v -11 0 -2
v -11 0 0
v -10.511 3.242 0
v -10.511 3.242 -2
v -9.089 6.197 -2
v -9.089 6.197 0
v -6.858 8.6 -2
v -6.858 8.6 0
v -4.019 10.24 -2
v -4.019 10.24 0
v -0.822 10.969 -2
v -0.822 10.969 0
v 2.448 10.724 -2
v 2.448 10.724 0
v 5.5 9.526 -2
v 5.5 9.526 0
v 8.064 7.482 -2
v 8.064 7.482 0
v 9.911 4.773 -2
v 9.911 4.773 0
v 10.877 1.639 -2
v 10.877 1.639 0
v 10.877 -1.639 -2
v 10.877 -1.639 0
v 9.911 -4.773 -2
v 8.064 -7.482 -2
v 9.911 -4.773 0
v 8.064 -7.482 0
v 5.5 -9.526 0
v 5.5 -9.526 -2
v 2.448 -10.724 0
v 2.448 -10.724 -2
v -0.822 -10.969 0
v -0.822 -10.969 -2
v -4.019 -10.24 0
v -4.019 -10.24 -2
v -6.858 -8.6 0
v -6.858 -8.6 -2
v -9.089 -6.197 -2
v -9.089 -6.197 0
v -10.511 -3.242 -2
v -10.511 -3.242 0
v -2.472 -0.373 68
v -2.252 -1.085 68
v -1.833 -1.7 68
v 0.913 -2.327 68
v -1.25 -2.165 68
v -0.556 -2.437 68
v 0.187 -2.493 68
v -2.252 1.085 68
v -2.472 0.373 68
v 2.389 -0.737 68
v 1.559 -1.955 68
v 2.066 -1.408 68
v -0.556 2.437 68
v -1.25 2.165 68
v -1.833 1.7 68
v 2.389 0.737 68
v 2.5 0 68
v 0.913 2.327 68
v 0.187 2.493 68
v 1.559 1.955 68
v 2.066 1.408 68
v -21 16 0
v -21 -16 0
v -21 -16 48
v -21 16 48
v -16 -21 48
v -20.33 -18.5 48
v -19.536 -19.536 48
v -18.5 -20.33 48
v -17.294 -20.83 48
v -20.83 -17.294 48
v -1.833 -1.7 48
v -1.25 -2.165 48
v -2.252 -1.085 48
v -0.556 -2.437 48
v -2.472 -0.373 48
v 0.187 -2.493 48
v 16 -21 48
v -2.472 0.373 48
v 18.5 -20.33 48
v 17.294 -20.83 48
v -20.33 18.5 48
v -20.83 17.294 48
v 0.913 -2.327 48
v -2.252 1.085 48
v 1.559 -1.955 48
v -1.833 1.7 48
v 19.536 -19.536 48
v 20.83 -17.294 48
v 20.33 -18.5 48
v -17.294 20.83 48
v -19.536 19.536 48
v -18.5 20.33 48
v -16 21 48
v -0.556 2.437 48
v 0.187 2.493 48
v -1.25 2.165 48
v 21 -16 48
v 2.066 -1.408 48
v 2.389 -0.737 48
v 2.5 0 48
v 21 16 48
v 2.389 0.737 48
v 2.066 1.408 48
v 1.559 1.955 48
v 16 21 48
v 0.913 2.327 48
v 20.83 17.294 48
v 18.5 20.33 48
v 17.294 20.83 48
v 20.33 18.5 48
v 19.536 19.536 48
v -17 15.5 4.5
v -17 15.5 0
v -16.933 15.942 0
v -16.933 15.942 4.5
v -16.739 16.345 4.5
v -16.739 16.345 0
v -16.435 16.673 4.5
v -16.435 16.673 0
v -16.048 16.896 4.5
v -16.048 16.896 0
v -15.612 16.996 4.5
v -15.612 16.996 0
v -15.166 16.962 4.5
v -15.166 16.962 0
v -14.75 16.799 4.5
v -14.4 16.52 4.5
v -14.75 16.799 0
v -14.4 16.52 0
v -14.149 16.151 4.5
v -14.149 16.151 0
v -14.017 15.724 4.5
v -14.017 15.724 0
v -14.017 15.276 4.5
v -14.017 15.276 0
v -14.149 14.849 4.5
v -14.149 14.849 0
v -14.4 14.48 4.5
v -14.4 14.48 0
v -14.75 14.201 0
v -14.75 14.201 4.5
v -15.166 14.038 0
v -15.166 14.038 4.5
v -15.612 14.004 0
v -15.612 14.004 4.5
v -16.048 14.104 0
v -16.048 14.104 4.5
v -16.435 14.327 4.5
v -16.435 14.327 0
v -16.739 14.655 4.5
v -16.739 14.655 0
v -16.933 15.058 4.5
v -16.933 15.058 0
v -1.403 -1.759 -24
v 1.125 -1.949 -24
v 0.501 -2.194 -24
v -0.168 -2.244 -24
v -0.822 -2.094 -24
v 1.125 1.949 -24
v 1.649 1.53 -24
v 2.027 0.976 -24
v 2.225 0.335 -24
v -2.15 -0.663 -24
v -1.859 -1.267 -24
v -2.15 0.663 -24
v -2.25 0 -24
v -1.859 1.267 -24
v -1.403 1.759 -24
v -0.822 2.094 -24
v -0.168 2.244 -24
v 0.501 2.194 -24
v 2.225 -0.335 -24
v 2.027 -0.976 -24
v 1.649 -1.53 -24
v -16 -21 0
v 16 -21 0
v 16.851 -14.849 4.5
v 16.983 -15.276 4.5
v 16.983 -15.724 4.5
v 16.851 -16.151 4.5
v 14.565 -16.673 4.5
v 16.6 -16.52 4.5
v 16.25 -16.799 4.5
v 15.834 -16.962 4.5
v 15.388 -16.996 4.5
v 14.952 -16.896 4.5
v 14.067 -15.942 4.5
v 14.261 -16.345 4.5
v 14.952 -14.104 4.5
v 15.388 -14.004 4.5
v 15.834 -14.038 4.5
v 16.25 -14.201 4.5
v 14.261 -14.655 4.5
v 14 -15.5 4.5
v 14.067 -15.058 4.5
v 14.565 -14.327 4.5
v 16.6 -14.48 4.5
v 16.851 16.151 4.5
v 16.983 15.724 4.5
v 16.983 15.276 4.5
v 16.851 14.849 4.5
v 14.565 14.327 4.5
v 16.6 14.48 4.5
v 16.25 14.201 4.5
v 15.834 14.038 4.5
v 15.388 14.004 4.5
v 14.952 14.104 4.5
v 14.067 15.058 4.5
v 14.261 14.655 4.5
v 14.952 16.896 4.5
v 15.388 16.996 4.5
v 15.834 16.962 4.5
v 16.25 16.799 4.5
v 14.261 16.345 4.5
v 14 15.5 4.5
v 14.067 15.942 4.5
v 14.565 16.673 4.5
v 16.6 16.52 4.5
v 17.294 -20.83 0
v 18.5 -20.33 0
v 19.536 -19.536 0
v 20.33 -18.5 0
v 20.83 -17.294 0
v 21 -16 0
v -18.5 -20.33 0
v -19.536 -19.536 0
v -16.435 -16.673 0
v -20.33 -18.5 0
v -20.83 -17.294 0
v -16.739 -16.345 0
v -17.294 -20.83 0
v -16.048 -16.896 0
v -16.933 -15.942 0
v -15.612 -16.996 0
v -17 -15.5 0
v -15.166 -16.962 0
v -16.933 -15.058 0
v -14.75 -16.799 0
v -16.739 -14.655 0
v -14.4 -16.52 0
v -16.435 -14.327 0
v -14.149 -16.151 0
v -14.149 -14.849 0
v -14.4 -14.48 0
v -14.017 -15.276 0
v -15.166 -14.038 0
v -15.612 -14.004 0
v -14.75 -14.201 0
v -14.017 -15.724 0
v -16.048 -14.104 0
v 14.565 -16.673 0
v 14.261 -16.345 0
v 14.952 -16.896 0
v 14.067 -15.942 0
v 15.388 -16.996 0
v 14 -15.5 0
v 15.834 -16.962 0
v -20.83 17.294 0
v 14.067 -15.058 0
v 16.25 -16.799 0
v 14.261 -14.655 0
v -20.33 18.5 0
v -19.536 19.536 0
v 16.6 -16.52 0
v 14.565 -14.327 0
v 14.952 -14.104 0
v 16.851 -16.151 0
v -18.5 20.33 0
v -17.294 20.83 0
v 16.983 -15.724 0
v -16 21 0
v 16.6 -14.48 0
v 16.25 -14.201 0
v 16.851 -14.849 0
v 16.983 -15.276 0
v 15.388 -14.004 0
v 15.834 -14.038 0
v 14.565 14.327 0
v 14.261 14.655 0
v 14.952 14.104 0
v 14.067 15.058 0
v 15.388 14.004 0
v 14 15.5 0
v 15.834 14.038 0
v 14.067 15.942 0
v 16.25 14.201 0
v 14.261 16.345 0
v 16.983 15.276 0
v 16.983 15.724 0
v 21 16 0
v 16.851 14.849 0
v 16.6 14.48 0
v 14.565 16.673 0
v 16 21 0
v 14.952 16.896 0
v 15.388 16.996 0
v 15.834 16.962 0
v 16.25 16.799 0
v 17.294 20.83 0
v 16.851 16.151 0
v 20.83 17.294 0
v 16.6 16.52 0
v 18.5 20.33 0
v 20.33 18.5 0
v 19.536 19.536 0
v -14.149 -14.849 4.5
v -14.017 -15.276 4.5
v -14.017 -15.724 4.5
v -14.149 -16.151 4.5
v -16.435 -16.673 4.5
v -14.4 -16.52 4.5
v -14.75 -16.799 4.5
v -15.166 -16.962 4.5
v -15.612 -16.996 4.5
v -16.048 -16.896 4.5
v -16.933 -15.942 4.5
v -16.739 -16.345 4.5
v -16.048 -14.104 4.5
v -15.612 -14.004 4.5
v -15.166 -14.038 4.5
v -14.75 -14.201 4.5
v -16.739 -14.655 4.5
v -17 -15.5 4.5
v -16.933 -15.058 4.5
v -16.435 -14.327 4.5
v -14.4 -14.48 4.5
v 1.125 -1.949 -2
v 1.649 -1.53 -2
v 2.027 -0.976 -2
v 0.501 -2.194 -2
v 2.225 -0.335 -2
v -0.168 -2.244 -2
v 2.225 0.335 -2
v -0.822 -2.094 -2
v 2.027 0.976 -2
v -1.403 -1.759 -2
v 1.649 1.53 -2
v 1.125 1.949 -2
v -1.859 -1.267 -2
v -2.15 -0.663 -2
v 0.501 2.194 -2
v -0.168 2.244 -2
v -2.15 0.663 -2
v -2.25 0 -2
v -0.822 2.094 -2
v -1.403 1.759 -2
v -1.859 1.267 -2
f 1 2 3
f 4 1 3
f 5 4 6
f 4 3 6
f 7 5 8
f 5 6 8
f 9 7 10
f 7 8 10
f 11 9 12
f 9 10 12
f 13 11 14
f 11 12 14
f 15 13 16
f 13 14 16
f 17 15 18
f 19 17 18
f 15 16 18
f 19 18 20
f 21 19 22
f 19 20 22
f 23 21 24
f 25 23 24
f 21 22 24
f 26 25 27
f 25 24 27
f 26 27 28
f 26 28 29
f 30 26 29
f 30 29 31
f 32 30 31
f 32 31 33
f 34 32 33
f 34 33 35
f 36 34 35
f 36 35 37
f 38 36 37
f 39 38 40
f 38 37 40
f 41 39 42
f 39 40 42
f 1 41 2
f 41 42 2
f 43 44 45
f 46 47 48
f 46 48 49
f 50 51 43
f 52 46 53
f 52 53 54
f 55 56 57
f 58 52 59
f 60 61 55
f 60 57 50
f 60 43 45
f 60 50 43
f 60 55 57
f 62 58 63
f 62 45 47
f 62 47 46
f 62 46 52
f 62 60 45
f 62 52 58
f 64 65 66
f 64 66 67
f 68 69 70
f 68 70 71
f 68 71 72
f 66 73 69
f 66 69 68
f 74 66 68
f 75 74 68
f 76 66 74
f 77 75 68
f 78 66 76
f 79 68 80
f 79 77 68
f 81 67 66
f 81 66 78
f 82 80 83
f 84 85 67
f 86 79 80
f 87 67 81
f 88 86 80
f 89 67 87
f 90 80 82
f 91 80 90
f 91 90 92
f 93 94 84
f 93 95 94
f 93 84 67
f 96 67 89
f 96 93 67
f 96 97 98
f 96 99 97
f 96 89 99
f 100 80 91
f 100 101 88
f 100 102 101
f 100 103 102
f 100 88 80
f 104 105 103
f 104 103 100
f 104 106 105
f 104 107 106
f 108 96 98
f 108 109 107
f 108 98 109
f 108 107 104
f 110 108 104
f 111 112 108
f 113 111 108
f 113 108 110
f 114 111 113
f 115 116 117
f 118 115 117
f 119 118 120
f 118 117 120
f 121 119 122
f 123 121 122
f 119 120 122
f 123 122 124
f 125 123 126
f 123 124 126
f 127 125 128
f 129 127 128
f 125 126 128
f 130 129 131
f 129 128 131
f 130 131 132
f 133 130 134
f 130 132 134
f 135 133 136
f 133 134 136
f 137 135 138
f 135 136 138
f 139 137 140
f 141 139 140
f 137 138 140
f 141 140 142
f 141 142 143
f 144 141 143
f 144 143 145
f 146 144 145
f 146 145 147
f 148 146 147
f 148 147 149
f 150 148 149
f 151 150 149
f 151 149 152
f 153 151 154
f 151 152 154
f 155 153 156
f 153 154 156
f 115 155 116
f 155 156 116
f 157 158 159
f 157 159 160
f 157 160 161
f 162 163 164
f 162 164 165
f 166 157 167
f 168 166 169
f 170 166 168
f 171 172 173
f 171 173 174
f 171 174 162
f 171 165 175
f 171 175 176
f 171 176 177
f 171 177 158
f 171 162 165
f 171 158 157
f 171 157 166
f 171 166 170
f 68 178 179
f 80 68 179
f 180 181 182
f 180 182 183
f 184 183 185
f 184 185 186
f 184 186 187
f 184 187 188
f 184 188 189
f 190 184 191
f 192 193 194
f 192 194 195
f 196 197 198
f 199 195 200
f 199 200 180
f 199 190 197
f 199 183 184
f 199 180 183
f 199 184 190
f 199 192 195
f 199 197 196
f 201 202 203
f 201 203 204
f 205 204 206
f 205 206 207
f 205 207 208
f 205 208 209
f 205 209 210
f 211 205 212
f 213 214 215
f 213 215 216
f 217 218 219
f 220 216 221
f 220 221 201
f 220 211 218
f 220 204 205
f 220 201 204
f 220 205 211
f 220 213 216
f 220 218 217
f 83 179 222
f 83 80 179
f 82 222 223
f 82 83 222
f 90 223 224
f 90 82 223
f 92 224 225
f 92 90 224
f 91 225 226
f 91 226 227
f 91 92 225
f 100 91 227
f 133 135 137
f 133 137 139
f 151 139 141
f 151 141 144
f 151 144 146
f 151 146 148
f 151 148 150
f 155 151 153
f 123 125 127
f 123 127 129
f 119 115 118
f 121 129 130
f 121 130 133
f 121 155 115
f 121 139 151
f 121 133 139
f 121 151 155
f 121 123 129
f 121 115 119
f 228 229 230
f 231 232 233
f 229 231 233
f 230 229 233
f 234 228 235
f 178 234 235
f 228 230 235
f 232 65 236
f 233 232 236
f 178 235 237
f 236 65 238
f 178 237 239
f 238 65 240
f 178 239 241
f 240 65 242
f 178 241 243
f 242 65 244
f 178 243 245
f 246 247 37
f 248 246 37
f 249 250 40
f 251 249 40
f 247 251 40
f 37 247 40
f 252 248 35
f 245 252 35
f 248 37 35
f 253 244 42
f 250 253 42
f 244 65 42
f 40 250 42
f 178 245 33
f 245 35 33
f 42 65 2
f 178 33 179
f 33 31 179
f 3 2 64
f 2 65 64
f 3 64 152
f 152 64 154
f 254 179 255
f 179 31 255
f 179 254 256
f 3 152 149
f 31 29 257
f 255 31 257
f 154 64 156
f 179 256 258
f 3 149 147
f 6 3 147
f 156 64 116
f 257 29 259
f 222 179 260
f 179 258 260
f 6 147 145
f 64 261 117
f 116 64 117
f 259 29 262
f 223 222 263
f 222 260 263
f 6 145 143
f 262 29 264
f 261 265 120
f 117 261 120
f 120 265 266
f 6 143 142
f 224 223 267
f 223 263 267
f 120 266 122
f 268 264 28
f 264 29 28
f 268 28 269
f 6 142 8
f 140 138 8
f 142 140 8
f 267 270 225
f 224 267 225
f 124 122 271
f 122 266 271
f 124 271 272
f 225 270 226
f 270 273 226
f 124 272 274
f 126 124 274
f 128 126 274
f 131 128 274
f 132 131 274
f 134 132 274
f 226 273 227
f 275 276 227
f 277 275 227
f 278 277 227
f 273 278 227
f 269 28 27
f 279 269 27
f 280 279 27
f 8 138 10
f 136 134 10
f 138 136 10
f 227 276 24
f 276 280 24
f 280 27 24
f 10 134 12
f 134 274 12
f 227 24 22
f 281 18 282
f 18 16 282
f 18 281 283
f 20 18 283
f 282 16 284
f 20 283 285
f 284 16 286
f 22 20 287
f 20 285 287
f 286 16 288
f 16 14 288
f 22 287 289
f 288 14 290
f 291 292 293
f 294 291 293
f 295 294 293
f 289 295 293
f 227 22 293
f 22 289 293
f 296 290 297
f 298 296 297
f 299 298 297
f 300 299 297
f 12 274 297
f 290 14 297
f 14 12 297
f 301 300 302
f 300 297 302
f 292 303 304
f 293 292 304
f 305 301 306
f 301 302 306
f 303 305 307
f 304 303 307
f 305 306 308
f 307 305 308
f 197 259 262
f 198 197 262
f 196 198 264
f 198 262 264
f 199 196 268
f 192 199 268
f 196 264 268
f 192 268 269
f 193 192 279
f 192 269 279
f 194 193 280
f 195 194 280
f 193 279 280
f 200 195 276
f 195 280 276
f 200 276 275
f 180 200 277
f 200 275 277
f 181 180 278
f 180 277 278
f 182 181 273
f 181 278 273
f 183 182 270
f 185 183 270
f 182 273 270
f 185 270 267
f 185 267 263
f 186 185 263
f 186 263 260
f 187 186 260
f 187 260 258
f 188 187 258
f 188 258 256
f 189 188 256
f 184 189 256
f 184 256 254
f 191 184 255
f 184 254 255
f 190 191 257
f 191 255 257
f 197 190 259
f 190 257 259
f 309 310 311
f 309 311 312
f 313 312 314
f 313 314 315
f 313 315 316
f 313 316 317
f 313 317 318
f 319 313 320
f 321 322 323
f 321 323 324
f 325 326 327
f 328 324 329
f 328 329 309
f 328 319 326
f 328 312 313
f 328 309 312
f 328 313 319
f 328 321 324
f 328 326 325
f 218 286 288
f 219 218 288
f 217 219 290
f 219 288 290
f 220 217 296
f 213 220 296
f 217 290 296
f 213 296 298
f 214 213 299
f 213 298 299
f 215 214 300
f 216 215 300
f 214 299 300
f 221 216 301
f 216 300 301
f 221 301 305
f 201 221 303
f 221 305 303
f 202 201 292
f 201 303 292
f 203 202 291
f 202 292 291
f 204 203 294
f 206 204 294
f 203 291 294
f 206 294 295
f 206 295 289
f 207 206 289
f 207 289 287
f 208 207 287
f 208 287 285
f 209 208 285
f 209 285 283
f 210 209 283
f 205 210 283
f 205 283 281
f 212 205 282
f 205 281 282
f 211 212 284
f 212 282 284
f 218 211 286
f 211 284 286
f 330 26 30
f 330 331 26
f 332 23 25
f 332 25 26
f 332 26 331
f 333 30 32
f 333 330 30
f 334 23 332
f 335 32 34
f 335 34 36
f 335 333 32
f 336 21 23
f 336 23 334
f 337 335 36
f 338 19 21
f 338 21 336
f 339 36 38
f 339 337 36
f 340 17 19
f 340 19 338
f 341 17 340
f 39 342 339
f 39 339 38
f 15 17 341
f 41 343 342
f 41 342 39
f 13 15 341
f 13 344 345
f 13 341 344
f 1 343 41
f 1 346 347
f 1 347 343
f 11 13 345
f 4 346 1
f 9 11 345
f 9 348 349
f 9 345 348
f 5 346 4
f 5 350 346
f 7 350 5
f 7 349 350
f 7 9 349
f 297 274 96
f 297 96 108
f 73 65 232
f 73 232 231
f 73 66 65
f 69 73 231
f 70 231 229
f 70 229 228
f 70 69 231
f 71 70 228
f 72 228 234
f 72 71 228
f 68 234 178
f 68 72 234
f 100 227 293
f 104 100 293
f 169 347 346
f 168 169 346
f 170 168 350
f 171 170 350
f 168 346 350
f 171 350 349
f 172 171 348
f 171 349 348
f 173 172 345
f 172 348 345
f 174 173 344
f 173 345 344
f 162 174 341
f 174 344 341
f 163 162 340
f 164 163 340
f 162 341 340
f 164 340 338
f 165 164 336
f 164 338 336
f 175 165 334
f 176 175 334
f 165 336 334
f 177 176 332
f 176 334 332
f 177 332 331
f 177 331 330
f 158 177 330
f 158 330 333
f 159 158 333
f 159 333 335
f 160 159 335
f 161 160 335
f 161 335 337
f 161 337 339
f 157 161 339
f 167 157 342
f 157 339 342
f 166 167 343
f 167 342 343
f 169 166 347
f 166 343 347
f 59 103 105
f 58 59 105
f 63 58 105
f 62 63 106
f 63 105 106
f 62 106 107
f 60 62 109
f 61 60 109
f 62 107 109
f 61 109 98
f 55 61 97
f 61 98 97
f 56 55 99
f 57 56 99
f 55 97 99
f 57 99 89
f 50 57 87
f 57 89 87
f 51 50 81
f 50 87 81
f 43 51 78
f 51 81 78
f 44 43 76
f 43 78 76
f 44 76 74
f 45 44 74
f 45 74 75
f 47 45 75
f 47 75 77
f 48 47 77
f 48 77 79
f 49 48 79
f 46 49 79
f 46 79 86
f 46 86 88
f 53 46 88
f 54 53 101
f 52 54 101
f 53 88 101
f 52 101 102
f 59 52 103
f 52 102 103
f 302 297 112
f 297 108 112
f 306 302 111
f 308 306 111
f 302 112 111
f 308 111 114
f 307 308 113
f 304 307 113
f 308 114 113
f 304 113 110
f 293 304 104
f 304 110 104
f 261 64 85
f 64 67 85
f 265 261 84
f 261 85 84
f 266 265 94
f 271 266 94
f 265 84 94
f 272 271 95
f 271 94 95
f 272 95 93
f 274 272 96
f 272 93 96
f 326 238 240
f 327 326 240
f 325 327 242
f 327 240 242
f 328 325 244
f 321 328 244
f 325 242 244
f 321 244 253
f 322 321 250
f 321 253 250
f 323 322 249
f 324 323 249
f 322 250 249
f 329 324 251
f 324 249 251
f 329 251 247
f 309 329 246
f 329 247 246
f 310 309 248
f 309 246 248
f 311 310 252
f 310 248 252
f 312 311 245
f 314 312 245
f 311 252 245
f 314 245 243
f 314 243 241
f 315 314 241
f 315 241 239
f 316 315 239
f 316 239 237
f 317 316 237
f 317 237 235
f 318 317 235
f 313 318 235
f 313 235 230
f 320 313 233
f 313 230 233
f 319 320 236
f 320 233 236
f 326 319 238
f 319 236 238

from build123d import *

# Parameters (mm, degrees)
SKETCH_1_W          = 42
SKETCH_1_H          = 42
EXTRUDE_1_DEPTH     = 48
SKETCH_2_R          = 11
EXTRUDE_2_DEPTH     = 2
SKETCH_3_R          = 2.25
EXTRUDE_3_DEPTH     = 22
SKETCH_4_R          = 1.5
CUT_EXTRUDE_1_DEPTH = 4.5
FILLET_1_R          = 5
SKETCH_5_R          = 2.5
EXTRUDE_4_DEPTH     = 20


with BuildPart() as part:
    # 草图1 → 凸台-拉伸1 (new body)
    with BuildSketch(Plane.XY):
        Rectangle(SKETCH_1_W, SKETCH_1_H)
    extrude(amount=EXTRUDE_1_DEPTH)

    # 草图2 → 凸台-拉伸2 (add)
    with BuildSketch(Plane(origin=(0, 0, 0), x_dir=(-1, 0, 0), z_dir=(0, 0, -1))):
        Circle(SKETCH_2_R)
    extrude(amount=EXTRUDE_2_DEPTH)

    # 草图3 → 凸台-拉伸3 (add)
    with BuildSketch(Plane(origin=(0, 0, -2), x_dir=(-1, 0, 0), z_dir=(0, 0, -1))):
        Circle(SKETCH_3_R)
    extrude(amount=EXTRUDE_3_DEPTH)

    # 草图4 → 切除-拉伸1 (cut)
    with BuildSketch(Plane(origin=(0, 0, 0), x_dir=(-1, 0, 0), z_dir=(0, 0, -1))):
        with Locations((-15.5, 15.5)):
            Circle(SKETCH_4_R)
        with Locations((15.5, 15.5)):
            Circle(SKETCH_4_R)
        with Locations((15.5, -15.5)):
            Circle(SKETCH_4_R)
        with Locations((-15.5, -15.5)):
            Circle(SKETCH_4_R)
    extrude(amount=-CUT_EXTRUDE_1_DEPTH, mode=Mode.SUBTRACT)

    # 圆角1
    fillet_1_edges = [part.edges().sort_by_distance(p)[0] for p in [
        (21, -21, 24),
        (-21, -21, 24),
        (-21, 21, 24),
        (21, 21, 24),
    ]]
    fillet(fillet_1_edges, radius=FILLET_1_R)

    # 草图5 → 凸台-拉伸4 (add)
    with BuildSketch(Plane.XY.offset(48)):
        Circle(SKETCH_5_R)
    extrude(amount=EXTRUDE_4_DEPTH)


solid = part.part
